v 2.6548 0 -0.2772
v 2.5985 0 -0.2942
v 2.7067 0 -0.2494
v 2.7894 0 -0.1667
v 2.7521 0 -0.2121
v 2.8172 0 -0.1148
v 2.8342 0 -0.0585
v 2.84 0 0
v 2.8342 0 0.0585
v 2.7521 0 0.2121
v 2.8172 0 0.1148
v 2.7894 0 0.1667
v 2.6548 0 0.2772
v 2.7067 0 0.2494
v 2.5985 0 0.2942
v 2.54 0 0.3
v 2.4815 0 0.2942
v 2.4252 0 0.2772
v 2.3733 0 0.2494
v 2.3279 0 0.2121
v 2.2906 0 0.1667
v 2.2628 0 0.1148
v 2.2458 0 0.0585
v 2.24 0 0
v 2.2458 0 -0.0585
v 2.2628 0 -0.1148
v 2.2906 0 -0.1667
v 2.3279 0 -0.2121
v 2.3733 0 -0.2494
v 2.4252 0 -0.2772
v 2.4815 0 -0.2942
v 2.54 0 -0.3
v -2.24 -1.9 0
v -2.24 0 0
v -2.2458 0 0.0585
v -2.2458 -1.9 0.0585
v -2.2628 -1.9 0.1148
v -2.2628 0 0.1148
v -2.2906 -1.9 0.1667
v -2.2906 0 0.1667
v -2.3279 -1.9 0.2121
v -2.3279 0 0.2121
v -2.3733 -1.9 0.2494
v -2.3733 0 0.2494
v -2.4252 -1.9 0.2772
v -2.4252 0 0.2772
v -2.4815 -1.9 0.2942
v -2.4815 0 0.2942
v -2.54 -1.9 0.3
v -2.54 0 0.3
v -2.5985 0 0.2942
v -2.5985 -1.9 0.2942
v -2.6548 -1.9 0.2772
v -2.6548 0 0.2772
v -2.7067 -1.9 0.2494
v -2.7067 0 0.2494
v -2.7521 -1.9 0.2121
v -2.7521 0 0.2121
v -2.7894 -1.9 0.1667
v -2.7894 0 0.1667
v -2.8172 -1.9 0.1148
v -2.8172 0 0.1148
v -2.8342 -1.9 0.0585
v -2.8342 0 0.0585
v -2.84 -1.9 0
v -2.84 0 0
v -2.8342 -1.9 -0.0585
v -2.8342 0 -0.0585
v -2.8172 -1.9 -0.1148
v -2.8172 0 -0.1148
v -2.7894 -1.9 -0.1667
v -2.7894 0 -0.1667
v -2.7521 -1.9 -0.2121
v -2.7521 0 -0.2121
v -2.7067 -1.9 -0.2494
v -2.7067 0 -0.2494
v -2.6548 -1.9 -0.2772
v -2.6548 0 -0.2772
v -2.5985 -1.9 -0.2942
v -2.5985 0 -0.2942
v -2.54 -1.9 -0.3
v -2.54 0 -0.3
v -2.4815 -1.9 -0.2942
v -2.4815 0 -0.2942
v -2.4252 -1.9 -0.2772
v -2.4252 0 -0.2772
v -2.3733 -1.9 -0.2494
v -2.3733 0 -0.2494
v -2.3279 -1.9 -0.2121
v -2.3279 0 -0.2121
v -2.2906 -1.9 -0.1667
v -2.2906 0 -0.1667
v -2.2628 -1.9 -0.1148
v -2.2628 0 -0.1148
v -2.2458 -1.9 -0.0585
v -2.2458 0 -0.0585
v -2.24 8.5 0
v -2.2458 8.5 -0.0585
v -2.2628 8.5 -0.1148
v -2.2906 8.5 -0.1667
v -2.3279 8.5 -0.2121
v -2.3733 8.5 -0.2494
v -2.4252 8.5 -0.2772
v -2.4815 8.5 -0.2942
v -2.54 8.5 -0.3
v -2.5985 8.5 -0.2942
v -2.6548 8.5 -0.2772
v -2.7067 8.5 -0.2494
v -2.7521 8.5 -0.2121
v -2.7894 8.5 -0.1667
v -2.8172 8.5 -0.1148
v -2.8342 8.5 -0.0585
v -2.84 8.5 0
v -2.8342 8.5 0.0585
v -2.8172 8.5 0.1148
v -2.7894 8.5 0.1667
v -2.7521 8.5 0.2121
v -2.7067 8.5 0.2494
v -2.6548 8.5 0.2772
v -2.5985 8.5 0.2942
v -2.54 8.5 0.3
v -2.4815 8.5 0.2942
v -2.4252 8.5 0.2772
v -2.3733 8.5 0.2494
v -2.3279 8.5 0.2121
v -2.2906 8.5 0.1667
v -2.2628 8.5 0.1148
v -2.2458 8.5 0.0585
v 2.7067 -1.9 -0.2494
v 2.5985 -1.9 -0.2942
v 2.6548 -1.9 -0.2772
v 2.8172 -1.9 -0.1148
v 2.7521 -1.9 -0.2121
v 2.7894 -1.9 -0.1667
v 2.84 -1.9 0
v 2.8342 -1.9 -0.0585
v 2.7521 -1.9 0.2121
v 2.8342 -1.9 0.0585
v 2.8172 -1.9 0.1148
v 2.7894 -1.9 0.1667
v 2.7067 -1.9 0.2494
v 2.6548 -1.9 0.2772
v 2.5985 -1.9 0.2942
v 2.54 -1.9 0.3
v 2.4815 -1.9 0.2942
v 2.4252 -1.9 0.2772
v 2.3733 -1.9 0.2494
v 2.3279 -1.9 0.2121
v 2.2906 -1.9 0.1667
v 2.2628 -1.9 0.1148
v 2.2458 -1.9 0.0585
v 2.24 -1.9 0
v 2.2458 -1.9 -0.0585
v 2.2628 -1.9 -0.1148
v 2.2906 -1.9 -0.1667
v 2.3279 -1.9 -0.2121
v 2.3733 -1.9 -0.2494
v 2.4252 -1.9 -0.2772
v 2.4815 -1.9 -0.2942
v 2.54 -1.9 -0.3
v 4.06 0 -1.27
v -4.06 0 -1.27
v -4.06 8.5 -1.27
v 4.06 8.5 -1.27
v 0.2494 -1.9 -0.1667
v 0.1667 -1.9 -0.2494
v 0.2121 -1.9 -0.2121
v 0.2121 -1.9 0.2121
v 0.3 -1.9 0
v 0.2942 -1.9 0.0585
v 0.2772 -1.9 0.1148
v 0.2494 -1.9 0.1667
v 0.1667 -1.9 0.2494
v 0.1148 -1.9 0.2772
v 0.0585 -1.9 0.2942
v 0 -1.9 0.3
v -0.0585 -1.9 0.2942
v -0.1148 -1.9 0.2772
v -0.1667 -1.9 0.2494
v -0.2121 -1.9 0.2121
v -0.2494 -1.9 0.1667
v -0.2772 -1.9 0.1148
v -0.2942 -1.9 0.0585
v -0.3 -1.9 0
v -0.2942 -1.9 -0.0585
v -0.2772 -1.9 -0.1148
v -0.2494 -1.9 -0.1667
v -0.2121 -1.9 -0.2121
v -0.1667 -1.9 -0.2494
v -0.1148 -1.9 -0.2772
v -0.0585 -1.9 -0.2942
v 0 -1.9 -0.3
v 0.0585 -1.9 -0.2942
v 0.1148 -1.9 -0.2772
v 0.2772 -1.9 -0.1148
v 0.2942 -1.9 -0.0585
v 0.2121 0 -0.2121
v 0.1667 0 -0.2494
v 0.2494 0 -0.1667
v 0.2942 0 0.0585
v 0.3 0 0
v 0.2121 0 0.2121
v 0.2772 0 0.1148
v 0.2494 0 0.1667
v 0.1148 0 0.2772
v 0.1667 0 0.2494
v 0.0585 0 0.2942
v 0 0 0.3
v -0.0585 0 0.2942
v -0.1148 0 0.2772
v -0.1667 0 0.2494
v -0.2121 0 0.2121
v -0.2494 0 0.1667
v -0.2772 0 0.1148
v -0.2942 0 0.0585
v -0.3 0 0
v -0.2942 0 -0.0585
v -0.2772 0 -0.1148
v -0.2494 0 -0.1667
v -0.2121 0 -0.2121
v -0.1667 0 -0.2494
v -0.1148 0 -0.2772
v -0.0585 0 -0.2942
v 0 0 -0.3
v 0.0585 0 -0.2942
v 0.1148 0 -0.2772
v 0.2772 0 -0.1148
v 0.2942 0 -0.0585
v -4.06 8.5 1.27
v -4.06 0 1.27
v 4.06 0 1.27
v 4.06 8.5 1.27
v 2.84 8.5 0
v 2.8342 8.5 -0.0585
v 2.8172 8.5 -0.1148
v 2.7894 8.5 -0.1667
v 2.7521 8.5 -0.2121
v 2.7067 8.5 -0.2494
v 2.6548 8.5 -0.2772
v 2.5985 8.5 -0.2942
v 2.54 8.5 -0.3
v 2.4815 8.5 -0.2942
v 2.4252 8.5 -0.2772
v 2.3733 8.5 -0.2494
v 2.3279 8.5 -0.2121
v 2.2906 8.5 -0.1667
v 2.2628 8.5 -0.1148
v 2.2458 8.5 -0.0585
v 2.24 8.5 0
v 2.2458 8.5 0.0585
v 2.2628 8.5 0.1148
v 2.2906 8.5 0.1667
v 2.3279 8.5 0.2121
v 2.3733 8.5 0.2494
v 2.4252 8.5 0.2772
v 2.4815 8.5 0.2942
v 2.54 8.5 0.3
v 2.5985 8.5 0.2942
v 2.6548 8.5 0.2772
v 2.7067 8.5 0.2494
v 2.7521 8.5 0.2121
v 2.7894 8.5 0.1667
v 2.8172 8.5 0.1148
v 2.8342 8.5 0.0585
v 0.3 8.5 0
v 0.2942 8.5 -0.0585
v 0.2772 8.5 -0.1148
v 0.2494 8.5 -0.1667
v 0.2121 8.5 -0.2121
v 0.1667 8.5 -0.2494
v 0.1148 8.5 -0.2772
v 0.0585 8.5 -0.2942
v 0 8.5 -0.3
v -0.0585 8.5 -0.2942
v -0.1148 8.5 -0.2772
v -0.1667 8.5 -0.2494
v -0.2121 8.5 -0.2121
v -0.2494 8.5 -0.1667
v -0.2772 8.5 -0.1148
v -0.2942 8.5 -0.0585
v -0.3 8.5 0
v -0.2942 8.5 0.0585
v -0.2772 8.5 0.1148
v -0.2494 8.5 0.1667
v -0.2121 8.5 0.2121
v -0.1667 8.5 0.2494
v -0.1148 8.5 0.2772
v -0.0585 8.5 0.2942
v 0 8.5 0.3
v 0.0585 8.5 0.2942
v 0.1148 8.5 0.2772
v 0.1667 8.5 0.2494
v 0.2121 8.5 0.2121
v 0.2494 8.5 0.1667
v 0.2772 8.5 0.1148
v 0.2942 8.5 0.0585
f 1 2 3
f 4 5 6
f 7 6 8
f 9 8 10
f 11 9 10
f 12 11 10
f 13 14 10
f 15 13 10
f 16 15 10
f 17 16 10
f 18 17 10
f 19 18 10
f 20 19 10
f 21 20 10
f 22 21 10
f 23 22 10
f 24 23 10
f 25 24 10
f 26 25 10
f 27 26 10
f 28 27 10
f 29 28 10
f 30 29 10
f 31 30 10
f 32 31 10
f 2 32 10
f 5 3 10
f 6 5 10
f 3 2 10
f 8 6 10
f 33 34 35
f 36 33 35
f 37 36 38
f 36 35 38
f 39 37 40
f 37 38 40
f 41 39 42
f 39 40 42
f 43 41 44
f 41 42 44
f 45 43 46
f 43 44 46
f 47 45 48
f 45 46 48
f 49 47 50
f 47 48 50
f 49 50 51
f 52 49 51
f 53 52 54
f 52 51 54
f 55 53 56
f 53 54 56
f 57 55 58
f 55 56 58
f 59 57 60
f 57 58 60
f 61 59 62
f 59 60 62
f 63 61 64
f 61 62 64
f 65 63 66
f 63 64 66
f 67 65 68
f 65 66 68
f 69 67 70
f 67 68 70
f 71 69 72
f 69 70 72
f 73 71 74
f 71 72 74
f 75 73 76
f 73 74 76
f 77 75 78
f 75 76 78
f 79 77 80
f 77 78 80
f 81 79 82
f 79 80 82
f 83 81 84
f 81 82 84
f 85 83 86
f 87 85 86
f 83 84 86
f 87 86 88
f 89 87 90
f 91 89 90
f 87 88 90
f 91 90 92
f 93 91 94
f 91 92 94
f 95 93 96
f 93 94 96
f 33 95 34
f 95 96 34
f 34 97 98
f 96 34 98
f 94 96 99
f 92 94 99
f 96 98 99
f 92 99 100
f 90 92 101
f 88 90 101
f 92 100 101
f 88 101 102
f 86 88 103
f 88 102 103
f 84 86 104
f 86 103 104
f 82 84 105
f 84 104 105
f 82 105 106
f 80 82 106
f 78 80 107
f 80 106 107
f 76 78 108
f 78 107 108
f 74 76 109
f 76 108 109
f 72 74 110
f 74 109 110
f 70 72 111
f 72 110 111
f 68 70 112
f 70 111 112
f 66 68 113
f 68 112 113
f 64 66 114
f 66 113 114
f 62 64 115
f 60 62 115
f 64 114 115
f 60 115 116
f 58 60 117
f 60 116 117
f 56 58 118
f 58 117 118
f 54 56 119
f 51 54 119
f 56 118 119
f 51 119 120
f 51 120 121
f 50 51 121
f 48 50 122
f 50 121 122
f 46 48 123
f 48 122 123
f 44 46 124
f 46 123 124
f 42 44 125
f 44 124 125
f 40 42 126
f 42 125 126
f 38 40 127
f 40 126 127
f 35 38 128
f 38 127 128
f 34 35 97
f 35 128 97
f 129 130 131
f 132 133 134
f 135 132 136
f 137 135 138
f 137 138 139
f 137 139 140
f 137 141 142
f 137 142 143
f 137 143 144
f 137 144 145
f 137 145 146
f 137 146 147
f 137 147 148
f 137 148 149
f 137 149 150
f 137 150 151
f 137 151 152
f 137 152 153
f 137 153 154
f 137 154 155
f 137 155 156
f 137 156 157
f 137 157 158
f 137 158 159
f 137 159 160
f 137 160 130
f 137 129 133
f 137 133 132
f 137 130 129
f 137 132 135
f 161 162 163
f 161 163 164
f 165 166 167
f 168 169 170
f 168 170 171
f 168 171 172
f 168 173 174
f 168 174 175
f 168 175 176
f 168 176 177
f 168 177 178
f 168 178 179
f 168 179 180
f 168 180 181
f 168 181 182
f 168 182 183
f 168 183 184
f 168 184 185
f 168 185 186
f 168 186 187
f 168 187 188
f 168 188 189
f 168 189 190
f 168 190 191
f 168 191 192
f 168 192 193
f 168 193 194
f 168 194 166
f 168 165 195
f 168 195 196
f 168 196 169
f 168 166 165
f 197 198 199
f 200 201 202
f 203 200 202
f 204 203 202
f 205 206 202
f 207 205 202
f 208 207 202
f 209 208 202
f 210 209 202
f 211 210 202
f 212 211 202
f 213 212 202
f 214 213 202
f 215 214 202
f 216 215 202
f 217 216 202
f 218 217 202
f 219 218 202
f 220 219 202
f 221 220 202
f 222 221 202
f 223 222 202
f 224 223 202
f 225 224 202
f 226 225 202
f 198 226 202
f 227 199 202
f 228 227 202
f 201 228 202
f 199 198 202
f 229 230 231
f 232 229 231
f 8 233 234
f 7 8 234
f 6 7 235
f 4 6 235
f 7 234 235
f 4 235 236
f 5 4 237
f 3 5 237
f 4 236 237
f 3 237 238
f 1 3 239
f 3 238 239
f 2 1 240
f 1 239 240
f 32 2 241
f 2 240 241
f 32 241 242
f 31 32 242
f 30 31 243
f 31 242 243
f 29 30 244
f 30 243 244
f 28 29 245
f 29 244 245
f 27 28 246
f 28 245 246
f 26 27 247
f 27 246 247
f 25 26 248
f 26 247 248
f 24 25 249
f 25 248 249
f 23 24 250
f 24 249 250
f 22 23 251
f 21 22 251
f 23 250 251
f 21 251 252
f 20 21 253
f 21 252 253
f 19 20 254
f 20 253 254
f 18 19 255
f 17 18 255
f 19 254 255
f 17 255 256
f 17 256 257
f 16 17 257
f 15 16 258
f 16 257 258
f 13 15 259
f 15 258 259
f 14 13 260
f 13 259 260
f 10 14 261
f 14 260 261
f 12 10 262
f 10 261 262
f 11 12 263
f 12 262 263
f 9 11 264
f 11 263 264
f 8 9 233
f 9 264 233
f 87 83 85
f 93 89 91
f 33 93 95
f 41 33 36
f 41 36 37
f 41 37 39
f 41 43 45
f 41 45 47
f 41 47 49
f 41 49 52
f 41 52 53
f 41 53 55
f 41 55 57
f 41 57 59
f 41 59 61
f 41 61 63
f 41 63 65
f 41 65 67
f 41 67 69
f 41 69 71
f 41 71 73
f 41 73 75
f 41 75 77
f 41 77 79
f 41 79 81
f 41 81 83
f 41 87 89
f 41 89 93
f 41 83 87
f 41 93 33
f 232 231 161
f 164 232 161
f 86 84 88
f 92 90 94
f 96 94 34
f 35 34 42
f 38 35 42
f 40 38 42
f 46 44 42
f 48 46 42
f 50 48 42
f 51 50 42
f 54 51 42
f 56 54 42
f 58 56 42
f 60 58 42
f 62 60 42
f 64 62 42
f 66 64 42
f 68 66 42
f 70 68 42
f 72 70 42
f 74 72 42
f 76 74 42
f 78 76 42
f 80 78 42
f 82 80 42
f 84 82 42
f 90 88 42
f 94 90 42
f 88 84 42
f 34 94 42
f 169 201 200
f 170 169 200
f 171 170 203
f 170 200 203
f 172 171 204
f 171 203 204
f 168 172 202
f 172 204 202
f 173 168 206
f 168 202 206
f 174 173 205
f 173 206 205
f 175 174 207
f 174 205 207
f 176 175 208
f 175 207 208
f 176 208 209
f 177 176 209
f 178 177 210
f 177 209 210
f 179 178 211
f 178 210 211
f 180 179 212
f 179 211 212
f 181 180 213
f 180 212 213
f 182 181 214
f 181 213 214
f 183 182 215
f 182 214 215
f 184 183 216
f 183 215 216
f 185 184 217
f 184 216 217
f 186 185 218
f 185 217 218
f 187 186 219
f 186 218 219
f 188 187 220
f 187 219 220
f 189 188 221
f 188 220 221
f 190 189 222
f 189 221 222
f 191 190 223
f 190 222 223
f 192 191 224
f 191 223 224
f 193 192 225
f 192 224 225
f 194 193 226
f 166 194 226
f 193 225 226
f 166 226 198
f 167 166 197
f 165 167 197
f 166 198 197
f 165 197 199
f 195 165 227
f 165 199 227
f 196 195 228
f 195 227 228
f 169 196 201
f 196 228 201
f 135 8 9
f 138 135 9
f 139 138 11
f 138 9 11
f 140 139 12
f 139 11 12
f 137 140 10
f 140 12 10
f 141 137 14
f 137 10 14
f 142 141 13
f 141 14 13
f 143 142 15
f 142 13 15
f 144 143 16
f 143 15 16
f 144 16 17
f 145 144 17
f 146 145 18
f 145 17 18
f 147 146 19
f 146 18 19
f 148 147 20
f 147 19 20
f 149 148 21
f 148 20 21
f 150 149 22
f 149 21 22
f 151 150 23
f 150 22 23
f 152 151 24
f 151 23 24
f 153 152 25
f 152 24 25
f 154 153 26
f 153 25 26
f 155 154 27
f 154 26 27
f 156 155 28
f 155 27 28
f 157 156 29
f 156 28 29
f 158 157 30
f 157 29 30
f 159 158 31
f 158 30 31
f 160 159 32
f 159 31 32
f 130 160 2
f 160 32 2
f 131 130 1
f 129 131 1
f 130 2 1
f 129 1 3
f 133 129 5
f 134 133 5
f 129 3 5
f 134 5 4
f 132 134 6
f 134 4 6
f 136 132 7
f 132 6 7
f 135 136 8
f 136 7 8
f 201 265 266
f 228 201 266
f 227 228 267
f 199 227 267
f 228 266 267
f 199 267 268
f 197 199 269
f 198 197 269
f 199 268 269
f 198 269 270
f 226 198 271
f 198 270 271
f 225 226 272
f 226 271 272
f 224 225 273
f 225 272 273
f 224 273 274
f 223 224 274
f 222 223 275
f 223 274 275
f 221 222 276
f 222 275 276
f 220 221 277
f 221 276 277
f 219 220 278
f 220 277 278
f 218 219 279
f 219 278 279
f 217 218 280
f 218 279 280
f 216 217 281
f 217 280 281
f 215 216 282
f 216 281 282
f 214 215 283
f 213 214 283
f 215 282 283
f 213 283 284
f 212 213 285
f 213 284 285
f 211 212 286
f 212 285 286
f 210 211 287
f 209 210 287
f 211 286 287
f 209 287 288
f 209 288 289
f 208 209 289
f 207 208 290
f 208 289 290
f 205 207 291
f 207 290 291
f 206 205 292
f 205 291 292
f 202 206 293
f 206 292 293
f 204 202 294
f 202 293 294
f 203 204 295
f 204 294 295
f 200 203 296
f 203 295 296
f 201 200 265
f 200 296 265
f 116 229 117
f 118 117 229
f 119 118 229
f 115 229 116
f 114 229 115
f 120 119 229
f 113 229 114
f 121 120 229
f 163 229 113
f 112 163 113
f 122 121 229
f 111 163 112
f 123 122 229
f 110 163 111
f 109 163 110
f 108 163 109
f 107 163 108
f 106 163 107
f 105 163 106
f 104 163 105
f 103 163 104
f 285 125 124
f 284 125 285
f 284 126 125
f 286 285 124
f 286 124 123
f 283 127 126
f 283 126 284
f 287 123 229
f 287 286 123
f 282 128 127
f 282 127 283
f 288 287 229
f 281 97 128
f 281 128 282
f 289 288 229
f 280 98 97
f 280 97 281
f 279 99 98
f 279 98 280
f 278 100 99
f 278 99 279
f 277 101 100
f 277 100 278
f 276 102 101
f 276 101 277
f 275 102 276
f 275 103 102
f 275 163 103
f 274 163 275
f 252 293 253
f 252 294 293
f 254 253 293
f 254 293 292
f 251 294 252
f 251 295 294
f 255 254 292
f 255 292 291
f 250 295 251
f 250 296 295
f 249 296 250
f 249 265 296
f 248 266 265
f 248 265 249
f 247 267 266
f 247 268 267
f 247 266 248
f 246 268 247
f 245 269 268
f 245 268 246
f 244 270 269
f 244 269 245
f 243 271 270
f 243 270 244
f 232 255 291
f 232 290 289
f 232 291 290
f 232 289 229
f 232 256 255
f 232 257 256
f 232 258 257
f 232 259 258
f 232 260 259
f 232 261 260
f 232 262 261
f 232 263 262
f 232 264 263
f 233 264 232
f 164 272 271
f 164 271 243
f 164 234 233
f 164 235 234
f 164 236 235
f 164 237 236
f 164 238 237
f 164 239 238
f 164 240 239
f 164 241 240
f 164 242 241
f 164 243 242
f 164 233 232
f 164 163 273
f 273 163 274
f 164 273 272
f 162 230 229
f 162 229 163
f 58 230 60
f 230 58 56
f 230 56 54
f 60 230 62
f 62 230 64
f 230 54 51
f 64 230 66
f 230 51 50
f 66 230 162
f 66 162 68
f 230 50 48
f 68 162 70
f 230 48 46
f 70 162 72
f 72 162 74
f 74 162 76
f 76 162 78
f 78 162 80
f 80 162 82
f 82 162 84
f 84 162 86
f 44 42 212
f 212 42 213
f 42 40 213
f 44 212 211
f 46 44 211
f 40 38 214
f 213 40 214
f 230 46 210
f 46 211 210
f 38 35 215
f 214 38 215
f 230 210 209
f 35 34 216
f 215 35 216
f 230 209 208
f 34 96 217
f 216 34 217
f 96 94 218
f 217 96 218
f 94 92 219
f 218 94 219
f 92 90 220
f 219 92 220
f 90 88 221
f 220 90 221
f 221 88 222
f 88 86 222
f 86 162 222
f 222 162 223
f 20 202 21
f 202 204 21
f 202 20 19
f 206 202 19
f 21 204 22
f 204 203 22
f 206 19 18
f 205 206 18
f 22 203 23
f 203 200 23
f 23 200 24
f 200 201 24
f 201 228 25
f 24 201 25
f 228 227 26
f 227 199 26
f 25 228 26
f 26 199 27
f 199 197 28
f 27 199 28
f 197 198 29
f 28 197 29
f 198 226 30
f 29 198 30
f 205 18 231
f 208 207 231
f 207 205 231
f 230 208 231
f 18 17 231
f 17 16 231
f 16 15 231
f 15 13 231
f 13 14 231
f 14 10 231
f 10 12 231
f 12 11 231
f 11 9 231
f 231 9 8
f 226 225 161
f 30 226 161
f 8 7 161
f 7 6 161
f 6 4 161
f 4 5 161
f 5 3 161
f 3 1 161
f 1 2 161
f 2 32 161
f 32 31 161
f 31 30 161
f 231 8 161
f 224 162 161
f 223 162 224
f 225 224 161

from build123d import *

# Parameters (mm, degrees)
SKETCH_1_W          = 8.12
SKETCH_1_H          = 2.54
EXTRUDE_1_DEPTH     = 8.5
SKETCH_2_R          = 0.3
CUT_EXTRUDE_1_DEPTH = 8.5
SKETCH_3_R          = 0.3
EXTRUDE_2_DEPTH     = 1.9
EXTRUDE_2_2_DEPTH   = 1.9
EXTRUDE_2_3_DEPTH   = 1.9


with BuildPart() as part:
    # Эскиз1 → Бобышка-Вытянуть1 (new body)
    with BuildSketch(Plane(origin=(0, 0, 0), x_dir=(1, 0, 0), z_dir=(0, 1, 0))):
        Rectangle(SKETCH_1_W, SKETCH_1_H)
    extrude(amount=EXTRUDE_1_DEPTH)

    # Эскиз2 → Вырез-Вытянуть1 (cut)
    with BuildSketch(Plane(origin=(0, 8.5, 0), x_dir=(1, 0, 0), z_dir=(0, 1, 0))):
        with Locations((-2.54, 0)):
            Circle(SKETCH_2_R)
        Circle(SKETCH_2_R)
        with Locations((2.54, 0)):
            Circle(SKETCH_2_R)
    extrude(amount=-CUT_EXTRUDE_1_DEPTH, mode=Mode.SUBTRACT)


with BuildPart() as body_2:
    # Эскиз3 → Бобышка-Вытянуть2 (new body)
    with BuildSketch(Plane.XZ):
        with Locations((-2.54, 0)):
            Circle(SKETCH_3_R)
    extrude(amount=EXTRUDE_2_DEPTH)


with BuildPart() as body_3:
    # Эскиз3 → Extrude 2 2 (new body)
    with BuildSketch(Plane.XZ):
        Circle(SKETCH_3_R)
    extrude(amount=EXTRUDE_2_2_DEPTH)


with BuildPart() as body_4:
    # Эскиз3 → Extrude 2 3 (new body)
    with BuildSketch(Plane.XZ):
        with Locations((2.54, 0)):
            Circle(SKETCH_3_R)
    extrude(amount=EXTRUDE_2_3_DEPTH)


solid = Compound([part.part, body_2.part, body_3.part, body_4.part])
